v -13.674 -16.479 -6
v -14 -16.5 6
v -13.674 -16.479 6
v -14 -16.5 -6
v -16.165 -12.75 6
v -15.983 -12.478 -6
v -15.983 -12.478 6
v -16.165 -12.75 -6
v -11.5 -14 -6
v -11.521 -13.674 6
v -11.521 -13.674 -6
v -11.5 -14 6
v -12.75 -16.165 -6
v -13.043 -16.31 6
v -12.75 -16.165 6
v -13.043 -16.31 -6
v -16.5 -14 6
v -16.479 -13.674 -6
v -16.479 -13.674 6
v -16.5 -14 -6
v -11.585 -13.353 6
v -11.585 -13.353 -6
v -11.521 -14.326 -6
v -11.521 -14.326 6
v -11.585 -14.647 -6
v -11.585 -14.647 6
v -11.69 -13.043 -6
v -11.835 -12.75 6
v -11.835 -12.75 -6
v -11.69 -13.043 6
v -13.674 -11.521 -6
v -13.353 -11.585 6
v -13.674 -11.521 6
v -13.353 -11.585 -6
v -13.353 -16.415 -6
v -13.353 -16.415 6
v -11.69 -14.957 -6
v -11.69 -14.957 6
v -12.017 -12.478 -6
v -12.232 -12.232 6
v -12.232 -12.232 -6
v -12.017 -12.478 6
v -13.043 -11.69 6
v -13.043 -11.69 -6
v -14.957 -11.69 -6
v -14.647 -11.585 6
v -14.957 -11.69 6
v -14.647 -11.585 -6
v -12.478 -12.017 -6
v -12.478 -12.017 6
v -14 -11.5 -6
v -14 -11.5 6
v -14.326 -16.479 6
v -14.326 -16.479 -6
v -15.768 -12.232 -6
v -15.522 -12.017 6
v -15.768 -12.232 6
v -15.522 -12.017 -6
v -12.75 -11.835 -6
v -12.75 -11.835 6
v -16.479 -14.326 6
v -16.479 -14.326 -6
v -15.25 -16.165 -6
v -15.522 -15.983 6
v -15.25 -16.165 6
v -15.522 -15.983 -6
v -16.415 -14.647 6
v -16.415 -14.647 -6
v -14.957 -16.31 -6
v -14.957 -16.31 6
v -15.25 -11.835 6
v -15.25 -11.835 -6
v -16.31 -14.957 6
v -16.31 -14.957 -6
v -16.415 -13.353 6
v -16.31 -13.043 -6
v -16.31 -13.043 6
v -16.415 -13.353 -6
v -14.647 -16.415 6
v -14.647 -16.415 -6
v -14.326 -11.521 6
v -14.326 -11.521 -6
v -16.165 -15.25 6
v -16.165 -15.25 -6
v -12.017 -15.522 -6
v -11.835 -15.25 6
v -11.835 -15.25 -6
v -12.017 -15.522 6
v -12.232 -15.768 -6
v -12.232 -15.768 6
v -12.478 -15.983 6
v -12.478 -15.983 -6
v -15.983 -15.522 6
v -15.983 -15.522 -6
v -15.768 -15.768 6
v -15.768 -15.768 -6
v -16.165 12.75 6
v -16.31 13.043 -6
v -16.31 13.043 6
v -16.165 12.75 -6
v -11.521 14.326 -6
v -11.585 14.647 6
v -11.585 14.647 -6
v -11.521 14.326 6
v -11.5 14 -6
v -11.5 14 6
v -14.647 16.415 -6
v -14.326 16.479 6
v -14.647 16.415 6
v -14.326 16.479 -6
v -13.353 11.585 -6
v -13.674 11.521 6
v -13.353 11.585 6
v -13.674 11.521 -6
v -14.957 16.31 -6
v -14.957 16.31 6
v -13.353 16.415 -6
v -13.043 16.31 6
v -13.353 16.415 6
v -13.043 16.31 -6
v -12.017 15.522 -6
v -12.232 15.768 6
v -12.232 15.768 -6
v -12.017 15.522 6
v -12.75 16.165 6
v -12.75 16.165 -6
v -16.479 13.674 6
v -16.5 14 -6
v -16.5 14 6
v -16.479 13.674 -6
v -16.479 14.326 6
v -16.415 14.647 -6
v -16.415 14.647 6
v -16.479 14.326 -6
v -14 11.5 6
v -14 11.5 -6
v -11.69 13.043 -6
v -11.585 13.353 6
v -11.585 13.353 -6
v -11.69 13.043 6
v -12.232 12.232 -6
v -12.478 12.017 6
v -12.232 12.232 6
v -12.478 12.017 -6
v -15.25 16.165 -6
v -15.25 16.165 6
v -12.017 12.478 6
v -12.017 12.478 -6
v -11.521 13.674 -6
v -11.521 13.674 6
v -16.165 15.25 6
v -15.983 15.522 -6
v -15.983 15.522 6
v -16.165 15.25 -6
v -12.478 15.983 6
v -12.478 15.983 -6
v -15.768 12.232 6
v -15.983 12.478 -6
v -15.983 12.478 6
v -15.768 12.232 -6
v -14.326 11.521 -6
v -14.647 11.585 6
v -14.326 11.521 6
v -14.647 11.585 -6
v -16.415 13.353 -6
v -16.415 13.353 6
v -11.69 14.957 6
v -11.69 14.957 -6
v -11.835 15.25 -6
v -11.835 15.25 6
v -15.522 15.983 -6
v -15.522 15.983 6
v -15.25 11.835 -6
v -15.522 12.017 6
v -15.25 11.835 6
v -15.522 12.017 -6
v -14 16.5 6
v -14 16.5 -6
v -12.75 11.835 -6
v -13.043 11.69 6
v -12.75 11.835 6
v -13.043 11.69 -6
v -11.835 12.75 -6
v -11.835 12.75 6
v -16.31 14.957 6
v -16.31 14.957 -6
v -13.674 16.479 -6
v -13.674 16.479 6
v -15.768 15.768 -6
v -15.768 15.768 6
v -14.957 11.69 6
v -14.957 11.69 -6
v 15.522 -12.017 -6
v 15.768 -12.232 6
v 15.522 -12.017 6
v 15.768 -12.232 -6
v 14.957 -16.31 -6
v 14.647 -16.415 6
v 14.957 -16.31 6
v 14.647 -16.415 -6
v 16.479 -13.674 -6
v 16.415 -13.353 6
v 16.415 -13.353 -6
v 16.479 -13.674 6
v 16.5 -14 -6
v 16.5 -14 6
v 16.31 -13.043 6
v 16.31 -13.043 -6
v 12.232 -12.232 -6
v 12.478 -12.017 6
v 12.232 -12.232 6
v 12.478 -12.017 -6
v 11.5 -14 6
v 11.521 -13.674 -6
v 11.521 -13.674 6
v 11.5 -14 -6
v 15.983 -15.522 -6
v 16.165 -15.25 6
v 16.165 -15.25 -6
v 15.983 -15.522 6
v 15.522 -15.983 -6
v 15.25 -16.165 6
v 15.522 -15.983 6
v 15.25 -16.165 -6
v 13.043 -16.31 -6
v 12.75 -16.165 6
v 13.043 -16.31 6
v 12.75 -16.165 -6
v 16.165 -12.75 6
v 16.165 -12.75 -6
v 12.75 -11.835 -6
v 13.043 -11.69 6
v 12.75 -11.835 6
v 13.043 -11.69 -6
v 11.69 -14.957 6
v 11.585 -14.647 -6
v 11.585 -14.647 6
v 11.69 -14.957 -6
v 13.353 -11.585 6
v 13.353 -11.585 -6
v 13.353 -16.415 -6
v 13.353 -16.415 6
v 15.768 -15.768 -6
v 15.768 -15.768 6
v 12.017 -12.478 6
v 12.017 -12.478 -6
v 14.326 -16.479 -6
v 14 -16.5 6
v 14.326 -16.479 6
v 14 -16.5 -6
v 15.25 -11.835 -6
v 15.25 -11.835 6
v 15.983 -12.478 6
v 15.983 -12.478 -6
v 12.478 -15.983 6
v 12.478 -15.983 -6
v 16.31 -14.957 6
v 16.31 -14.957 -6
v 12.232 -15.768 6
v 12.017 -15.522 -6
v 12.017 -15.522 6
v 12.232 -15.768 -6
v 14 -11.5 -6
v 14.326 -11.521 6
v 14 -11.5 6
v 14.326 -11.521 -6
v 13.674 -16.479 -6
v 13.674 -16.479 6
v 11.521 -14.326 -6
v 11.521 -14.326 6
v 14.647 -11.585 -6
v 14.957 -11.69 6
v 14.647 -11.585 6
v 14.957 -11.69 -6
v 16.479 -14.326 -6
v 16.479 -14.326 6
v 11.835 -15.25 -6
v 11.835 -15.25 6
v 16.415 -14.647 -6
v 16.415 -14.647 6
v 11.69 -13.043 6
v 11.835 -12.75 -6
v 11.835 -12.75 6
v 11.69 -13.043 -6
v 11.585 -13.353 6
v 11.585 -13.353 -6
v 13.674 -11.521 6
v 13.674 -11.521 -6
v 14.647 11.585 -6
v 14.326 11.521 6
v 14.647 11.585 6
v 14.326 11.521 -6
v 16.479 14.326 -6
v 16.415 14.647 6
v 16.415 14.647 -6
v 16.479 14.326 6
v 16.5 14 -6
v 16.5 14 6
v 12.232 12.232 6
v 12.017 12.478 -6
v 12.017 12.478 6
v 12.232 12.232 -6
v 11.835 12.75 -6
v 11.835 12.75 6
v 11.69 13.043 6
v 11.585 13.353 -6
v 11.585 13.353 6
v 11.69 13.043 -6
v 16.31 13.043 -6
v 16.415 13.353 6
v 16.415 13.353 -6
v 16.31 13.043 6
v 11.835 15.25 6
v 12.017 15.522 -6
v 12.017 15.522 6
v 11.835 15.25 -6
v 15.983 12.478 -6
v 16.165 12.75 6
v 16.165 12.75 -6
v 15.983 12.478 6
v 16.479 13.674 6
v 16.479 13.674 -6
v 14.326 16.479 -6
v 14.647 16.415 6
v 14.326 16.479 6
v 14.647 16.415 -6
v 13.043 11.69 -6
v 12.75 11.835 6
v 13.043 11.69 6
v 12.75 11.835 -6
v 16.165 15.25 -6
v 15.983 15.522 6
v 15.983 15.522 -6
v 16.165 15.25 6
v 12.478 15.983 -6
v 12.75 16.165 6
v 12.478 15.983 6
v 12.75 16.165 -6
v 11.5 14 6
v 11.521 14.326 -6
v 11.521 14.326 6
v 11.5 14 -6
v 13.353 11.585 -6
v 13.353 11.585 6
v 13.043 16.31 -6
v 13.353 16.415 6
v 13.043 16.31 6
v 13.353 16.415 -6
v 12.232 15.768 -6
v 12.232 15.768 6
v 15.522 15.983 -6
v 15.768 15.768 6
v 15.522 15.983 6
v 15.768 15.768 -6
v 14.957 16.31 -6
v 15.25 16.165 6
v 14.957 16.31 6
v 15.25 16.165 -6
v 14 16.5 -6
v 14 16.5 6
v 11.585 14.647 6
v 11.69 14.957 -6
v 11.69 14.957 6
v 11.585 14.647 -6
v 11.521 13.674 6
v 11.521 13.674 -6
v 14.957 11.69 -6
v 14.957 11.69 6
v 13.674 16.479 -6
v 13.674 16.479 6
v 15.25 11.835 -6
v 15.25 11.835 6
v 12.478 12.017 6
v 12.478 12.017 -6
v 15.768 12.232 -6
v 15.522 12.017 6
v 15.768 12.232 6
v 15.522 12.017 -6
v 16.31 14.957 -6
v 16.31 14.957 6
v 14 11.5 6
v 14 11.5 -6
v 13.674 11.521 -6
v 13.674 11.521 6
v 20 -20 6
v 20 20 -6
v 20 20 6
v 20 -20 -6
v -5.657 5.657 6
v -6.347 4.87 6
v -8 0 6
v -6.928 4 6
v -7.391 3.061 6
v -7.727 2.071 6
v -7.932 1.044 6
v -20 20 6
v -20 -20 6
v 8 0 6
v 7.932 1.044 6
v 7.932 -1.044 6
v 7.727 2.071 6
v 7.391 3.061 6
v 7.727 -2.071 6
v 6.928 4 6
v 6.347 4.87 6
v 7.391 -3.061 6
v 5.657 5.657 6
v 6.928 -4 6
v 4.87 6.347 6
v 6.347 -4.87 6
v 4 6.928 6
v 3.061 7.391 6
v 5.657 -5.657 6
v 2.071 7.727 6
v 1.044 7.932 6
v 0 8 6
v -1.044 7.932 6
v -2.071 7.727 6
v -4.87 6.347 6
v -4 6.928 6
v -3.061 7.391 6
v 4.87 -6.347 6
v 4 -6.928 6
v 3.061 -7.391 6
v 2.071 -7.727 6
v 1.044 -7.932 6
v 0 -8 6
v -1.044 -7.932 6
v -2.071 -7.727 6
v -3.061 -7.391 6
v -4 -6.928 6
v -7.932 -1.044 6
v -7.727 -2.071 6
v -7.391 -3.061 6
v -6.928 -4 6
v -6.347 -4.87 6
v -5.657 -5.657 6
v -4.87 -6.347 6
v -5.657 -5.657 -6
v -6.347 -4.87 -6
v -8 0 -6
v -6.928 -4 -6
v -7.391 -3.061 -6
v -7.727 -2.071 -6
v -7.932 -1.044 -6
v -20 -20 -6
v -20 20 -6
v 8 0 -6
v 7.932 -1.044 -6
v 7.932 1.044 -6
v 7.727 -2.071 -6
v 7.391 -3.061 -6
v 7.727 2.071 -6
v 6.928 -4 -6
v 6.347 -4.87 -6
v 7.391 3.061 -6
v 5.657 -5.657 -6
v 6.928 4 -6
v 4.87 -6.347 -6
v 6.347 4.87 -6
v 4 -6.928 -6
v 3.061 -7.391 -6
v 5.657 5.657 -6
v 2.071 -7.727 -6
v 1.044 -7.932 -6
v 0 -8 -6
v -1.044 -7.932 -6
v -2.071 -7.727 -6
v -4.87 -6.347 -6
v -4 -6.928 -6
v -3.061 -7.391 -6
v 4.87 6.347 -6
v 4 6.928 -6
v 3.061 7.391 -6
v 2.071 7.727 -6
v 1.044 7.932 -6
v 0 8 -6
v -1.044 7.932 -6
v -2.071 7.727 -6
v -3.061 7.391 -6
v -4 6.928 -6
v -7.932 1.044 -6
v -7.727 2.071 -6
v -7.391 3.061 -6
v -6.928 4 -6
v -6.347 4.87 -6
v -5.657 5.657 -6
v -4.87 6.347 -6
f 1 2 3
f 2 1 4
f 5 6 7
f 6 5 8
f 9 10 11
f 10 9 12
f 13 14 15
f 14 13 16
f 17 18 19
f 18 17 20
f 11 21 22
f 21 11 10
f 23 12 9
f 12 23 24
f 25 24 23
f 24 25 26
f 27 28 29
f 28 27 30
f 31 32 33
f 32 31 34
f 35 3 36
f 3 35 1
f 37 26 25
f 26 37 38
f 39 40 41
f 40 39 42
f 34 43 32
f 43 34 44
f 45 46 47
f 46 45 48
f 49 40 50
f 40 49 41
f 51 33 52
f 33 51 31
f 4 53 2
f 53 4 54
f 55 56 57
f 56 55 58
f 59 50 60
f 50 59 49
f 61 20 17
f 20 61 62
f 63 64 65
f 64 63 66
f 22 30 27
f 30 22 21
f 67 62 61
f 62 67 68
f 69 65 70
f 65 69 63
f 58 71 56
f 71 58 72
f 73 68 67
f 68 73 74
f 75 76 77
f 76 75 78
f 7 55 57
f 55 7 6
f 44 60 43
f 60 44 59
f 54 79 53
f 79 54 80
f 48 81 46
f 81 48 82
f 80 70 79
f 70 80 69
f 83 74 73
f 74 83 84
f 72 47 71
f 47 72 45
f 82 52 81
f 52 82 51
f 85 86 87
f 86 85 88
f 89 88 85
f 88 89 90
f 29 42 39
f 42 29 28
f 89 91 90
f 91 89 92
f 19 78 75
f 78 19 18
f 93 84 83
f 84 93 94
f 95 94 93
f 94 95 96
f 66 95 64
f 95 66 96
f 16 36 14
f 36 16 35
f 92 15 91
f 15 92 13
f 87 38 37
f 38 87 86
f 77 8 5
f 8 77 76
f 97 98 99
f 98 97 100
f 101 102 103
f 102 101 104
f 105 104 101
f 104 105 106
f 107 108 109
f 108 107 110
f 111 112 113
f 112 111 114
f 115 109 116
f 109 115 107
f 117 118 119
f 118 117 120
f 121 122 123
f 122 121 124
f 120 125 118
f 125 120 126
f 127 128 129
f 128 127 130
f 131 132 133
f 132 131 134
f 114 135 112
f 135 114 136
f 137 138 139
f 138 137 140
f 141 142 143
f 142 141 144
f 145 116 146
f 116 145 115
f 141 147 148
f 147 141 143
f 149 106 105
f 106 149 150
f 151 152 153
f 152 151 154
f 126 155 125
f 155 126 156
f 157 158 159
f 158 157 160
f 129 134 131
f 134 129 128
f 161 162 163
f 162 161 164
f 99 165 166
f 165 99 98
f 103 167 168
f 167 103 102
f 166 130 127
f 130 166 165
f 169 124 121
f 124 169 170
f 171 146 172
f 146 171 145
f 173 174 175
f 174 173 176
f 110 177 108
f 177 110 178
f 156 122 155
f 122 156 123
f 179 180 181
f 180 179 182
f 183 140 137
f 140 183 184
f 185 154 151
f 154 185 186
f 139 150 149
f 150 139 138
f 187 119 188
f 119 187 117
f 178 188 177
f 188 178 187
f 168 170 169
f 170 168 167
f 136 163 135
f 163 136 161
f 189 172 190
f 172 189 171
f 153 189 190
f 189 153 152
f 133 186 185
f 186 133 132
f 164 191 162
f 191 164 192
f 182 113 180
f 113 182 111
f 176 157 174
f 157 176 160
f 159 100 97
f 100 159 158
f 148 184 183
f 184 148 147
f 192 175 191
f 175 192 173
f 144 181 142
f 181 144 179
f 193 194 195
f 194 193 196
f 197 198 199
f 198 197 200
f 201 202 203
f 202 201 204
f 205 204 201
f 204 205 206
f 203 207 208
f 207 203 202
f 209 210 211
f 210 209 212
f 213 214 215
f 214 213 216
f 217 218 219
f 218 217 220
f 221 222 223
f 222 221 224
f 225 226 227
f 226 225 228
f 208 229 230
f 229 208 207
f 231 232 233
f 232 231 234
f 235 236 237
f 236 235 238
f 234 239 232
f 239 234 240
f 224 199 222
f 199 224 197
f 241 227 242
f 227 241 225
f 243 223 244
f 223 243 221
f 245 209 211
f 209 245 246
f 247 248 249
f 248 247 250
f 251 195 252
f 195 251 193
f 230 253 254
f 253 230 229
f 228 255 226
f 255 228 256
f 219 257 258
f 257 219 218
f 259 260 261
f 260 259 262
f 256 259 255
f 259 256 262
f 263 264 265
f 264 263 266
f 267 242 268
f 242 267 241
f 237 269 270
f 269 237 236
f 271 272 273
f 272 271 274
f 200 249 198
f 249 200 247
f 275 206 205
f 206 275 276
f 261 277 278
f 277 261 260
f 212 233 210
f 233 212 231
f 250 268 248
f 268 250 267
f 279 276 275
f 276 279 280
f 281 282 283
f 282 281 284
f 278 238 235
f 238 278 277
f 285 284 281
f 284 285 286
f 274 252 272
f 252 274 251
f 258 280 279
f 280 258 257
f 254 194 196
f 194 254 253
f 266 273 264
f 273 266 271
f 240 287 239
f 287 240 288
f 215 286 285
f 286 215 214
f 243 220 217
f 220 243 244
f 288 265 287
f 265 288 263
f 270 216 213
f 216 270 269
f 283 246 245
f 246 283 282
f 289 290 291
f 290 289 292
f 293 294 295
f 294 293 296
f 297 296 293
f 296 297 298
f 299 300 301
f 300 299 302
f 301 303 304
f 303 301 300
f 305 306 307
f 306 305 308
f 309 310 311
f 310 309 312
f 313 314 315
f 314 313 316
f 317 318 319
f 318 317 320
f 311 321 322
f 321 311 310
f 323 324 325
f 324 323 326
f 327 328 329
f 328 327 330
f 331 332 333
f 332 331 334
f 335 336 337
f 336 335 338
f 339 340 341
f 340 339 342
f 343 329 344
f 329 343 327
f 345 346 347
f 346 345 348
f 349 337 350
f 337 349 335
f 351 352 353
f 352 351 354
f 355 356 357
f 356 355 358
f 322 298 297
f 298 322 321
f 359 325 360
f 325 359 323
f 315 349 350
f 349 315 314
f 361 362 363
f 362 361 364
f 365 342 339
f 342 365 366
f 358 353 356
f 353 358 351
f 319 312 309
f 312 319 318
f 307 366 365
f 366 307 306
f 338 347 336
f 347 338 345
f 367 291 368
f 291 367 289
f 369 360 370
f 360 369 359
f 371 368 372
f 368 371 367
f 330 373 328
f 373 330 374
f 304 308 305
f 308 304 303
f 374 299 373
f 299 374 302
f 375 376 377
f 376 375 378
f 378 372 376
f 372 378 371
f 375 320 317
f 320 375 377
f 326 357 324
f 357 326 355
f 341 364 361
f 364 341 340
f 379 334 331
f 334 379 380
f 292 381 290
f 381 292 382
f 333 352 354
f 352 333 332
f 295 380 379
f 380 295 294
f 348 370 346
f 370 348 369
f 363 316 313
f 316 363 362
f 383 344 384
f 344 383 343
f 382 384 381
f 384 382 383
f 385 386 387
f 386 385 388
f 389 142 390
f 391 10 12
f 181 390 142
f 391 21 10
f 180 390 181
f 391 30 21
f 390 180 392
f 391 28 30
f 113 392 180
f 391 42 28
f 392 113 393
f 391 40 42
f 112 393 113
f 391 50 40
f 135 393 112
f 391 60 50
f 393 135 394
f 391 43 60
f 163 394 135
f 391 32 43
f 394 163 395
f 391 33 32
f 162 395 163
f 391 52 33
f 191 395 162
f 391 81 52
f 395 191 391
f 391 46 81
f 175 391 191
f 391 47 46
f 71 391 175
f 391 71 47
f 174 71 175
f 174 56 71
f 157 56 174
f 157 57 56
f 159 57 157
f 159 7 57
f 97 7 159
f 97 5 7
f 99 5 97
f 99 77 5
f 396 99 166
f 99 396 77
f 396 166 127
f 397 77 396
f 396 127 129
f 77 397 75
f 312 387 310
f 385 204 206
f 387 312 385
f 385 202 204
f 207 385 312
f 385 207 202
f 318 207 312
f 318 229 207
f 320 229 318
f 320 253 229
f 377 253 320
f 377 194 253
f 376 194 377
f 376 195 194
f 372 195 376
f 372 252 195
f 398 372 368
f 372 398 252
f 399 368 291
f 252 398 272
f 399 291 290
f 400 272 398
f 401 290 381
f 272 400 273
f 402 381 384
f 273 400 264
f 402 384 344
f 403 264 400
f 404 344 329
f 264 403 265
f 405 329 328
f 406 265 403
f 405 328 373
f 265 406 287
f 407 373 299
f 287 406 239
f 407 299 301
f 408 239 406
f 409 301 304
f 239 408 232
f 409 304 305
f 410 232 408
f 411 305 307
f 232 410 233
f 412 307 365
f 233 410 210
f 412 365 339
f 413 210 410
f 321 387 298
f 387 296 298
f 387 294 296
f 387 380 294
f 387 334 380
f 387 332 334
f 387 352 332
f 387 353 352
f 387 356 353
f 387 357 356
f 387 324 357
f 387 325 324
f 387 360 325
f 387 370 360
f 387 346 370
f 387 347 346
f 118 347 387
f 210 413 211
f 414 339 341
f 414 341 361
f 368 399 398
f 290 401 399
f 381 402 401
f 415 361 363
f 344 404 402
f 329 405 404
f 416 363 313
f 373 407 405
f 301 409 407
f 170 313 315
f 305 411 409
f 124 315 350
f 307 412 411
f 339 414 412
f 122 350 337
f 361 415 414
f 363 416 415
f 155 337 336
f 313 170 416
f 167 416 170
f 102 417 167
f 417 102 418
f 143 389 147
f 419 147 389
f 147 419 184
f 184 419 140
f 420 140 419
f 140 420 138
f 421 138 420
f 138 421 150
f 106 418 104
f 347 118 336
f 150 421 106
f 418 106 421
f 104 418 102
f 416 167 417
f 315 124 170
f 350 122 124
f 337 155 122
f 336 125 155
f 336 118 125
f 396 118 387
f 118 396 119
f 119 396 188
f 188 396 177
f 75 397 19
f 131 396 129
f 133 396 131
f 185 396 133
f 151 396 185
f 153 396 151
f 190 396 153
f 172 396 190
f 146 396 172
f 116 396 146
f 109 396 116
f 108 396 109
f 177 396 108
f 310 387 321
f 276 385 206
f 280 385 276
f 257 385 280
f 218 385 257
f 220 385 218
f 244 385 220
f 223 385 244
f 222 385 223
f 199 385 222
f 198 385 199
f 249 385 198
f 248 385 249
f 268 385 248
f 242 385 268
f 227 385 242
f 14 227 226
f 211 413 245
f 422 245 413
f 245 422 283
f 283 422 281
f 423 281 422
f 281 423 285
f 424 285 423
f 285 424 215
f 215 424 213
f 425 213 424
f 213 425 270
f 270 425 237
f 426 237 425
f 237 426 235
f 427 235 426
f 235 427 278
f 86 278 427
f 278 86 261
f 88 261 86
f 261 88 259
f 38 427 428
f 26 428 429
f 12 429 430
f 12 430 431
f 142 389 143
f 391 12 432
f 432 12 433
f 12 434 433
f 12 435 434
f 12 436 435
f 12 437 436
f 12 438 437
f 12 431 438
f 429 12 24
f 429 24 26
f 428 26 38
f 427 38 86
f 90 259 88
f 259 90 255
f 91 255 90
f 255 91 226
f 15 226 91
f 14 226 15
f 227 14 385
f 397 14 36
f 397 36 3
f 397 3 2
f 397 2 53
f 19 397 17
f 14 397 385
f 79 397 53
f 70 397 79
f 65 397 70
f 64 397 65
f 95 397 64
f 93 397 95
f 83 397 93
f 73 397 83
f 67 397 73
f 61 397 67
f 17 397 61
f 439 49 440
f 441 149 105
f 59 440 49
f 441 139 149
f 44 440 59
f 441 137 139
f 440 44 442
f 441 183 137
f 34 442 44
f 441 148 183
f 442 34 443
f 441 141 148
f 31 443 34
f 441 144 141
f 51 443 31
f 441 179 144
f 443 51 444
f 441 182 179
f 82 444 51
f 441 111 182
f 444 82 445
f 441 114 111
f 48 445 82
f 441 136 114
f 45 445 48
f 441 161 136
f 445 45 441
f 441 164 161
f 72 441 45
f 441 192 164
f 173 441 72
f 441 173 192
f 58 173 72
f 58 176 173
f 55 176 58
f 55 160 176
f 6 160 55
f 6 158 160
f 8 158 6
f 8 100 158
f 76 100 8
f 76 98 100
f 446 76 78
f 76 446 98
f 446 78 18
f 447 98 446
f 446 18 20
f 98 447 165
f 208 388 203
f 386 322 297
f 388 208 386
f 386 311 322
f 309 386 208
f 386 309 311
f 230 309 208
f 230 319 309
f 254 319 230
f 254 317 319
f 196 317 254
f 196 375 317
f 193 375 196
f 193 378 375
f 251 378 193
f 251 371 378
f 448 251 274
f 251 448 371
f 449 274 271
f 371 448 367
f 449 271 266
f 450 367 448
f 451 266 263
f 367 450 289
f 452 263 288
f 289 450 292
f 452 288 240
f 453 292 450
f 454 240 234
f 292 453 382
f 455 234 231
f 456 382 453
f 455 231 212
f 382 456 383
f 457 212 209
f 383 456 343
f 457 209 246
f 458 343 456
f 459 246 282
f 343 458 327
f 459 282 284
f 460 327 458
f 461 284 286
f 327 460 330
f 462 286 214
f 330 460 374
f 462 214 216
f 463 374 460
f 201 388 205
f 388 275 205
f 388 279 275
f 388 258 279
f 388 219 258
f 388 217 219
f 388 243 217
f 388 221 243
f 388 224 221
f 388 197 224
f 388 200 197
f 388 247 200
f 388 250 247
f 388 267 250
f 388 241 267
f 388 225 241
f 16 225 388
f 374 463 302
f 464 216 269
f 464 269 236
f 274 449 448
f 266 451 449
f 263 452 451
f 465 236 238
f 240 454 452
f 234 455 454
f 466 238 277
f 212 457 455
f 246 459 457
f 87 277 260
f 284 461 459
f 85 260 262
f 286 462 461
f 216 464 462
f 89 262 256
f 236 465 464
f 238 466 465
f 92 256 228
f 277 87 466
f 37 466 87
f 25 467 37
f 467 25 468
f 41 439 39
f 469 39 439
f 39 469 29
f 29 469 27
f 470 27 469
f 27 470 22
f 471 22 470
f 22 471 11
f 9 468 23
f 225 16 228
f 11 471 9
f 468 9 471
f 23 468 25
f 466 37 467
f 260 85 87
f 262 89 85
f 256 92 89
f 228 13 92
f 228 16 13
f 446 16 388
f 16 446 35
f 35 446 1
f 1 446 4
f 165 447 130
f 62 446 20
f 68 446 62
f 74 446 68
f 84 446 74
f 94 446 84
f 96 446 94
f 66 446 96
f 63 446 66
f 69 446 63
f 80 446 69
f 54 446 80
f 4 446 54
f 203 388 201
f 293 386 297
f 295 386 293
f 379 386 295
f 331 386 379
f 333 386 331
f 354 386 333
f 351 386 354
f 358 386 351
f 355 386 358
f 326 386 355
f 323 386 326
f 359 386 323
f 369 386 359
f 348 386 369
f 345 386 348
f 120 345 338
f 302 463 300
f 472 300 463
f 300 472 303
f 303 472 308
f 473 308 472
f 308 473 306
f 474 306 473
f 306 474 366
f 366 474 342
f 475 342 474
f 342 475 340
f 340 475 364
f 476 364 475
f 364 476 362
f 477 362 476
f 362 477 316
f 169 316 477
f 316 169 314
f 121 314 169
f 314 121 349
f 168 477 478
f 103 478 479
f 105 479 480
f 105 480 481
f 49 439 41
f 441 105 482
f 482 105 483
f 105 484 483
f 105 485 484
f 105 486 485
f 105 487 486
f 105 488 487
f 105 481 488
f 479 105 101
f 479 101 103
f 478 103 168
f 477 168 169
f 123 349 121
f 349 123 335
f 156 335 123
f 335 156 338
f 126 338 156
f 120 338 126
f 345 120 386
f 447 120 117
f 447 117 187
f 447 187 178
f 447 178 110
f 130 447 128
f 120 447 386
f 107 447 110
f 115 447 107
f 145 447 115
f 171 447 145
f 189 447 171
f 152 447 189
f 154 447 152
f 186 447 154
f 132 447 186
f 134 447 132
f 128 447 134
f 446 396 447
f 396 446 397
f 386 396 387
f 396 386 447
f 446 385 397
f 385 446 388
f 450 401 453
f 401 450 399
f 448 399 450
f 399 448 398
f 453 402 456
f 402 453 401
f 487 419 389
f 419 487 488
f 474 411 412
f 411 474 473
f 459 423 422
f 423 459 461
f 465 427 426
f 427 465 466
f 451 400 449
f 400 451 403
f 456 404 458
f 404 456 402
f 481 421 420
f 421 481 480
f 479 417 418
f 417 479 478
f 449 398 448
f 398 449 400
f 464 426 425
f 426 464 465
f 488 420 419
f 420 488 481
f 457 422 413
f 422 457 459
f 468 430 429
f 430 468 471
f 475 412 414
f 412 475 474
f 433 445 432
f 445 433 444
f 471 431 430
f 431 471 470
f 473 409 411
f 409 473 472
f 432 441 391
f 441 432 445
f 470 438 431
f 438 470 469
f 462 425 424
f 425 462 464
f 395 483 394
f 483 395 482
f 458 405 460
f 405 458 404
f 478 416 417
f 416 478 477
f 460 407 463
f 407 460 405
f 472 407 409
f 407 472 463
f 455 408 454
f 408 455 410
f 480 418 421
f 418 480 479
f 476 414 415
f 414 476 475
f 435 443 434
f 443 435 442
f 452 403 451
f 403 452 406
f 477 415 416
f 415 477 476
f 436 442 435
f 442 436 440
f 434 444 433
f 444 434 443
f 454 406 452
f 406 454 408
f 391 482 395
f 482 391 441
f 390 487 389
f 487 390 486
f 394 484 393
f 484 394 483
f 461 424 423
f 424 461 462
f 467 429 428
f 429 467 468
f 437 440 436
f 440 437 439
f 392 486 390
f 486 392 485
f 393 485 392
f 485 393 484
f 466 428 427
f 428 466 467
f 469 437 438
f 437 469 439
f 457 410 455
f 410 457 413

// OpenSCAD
// 02 — 합치고 빼기 (불리언)
//
// CAD의 핵심 동작입니다. 덩어리에서 구멍을 파내는 식으로 형상을 만듭니다.

$fn = 48;

difference() {                       // 앞의 것에서 뒤의 것들을 빼낸다
  cube([40, 40, 12], center = true);

  cylinder(h = 20, r = 8, center = true);          // 가운데 구멍

  for (x = [-14, 14], y = [-14, 14])               // 네 귀퉁이 나사 구멍
    translate([x, y, 0])
      cylinder(h = 20, r = 2.5, center = true);
}
